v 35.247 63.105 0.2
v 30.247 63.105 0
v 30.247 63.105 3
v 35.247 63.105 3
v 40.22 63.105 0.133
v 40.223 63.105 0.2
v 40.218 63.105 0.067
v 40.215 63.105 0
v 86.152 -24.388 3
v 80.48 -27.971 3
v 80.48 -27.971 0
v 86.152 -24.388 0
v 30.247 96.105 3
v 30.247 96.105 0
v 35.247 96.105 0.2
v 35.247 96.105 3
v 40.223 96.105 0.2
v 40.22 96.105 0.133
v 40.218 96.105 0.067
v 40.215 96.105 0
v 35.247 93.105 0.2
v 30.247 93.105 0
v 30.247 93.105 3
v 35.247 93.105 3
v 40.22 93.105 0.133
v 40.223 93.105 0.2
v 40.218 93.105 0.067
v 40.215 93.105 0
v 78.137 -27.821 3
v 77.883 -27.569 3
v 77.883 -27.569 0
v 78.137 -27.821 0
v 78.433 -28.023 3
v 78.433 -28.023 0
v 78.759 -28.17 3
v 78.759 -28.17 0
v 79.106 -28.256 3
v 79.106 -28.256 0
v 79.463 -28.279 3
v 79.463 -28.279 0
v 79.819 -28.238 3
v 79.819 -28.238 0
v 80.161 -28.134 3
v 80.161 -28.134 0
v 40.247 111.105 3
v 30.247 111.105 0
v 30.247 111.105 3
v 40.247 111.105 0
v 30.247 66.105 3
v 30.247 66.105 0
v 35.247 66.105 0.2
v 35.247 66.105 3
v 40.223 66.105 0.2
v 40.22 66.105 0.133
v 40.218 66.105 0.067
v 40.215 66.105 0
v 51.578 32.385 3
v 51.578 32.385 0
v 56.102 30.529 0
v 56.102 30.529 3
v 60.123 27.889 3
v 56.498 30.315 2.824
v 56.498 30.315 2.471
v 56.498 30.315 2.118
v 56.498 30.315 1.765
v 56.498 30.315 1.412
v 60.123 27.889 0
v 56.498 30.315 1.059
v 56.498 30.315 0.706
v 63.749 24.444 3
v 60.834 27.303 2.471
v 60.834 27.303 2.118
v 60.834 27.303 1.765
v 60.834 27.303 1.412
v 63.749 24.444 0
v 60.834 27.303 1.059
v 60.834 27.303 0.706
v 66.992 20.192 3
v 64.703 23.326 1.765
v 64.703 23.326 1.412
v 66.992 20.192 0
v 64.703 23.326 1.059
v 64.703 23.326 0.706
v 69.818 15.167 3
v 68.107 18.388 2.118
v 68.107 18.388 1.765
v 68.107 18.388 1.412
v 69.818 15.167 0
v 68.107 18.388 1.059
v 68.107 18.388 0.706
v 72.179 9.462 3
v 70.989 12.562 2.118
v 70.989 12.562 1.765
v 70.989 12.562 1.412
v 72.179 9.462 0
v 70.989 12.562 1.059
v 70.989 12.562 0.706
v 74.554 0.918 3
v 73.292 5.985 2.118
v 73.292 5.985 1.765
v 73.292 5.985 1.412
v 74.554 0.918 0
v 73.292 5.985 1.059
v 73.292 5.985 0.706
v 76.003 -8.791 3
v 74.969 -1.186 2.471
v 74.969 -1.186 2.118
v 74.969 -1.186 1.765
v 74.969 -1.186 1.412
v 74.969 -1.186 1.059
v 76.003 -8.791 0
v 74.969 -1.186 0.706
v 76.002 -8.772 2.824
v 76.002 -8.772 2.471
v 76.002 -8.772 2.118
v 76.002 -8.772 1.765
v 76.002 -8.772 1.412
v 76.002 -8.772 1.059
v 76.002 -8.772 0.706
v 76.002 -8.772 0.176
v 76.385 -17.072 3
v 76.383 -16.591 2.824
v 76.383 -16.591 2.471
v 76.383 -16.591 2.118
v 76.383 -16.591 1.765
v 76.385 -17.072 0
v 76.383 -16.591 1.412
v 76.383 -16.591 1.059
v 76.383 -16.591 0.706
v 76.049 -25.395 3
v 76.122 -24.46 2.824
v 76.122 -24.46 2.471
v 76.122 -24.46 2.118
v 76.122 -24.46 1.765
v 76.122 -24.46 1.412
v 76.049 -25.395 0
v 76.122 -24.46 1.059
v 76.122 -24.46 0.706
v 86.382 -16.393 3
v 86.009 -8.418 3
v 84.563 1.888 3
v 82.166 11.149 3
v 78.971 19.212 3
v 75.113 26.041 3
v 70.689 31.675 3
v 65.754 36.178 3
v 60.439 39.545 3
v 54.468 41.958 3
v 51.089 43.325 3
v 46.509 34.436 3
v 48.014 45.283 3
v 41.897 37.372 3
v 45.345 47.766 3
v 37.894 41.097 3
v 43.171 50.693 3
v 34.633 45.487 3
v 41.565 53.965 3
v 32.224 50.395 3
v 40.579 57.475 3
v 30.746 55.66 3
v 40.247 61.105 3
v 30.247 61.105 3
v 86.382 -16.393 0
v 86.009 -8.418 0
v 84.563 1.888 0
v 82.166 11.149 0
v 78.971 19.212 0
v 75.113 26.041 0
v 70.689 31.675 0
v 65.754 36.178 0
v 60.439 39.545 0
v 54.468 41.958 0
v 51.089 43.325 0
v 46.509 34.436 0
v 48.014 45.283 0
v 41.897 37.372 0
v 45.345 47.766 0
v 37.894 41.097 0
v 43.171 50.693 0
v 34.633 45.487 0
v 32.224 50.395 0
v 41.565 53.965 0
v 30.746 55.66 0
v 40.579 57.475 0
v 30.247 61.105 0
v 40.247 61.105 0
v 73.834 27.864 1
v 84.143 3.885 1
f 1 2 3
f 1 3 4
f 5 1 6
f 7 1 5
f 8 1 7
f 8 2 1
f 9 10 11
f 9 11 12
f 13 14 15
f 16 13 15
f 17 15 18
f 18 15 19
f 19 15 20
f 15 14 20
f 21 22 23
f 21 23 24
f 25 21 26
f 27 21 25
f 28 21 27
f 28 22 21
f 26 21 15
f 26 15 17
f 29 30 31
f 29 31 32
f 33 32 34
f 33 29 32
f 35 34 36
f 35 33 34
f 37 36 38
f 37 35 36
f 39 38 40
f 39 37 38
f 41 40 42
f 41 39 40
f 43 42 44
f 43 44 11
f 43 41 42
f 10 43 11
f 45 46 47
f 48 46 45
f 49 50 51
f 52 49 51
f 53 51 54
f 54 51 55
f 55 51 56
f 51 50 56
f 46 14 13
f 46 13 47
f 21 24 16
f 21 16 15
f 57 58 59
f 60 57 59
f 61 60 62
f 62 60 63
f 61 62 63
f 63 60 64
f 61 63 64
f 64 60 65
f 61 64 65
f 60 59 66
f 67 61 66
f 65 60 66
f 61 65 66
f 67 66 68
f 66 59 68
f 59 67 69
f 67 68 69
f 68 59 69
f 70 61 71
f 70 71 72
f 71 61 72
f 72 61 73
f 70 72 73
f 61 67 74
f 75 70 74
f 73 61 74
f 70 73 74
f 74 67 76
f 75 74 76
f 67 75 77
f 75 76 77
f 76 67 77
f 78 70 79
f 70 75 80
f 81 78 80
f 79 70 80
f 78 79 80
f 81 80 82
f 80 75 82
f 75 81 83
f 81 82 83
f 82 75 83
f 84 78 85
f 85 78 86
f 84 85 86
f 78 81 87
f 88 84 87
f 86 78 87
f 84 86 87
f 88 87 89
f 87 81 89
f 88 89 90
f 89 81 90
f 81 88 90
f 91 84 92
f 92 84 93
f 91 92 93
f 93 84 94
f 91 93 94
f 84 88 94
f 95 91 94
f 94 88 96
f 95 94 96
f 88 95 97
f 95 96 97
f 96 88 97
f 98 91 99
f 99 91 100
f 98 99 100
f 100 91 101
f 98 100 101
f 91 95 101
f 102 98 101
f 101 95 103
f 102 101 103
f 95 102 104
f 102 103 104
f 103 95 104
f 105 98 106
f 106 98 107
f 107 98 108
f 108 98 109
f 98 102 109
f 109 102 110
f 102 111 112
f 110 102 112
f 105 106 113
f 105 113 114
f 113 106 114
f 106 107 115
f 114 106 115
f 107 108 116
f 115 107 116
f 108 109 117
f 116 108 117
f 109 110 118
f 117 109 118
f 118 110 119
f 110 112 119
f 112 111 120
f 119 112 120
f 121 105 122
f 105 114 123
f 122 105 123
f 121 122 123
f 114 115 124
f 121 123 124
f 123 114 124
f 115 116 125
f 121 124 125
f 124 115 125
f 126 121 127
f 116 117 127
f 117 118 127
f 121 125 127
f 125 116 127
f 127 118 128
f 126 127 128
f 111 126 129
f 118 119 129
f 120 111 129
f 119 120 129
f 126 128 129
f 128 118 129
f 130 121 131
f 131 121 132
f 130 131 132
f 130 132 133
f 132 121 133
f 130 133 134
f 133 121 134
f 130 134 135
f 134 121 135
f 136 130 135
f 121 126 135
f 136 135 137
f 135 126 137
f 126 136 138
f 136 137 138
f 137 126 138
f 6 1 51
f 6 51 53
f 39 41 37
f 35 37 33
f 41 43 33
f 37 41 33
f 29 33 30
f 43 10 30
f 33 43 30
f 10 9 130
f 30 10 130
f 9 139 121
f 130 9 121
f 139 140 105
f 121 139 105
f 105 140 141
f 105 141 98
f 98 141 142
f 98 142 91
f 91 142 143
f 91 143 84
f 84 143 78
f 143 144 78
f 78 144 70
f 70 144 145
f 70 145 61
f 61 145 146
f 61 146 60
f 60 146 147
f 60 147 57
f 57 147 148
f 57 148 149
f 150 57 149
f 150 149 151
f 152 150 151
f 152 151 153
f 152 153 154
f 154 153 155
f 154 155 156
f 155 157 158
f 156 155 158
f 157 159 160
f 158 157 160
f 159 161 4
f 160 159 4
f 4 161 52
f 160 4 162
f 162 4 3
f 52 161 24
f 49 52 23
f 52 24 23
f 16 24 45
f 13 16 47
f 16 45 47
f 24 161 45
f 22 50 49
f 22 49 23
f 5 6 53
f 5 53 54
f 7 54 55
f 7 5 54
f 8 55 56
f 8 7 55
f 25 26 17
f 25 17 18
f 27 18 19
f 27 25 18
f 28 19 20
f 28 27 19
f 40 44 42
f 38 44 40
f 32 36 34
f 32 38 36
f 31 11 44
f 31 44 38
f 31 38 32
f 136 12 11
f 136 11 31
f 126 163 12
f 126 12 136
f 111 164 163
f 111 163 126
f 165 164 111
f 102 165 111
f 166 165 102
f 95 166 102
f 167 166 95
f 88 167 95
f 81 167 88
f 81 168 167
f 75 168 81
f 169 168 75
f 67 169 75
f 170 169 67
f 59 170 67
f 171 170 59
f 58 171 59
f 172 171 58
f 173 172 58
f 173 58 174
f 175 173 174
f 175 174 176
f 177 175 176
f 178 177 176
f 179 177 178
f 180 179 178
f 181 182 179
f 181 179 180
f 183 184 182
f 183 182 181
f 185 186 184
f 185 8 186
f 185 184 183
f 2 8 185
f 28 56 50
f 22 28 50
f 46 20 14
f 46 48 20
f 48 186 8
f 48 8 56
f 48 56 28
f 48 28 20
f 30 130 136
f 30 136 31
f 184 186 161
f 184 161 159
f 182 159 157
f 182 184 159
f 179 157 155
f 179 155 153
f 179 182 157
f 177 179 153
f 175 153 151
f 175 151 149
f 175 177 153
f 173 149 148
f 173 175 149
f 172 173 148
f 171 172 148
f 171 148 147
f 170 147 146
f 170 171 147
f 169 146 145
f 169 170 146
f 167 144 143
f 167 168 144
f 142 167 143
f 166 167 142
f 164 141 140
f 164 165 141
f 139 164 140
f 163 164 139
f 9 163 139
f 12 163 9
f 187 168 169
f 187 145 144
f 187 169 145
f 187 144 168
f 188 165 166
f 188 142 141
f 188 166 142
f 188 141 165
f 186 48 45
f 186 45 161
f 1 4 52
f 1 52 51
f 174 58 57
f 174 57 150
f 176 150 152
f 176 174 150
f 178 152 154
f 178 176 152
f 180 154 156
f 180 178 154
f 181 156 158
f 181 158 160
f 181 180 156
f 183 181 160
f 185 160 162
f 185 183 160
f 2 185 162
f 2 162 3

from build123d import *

# Parameters (mm, degrees)
BOSS_EXTRU_2_DEPTH      = 3
ENL_V_MAT_EXTRU_1_DEPTH = 141.768934672
EMPREINTE1_START        = 63.105178129
EMPREINTE1_DEPTH        = 3
EMPREINTE1_START_2      = 93.105178129
EMPREINTE1_2_DEPTH      = 3


# Read off the part's stored shape, not the designer's step: Empreinte1
with BuildPart() as part:
    # Esquisse1 → Boss.-Extru.2 (new body)
    with BuildSketch(Plane.XY):
        with BuildLine():
            Line((40.247233076, 111.105178129), (40.247233076, 61.105178129))
            ThreePointArc((40.247233076, 61.105178129), (44.191308202, 49.180108885), (54.467960723, 41.95837654))
            add(Edge.make_bspline(
                [(54.467960723, 41.95837654), (93.469157599, 30.186251687), (94.060386504, -42.130931626), (70.625681641, -69.023414216)],
                knots=[0.073601613, 0.073601613, 0.073601613, 0.073601613, 1, 1, 1, 1], degree=3))
            Line((70.625681641, -69.023414216), (63.086562616, -62.453658944))
            add(Edge.make_bspline(
                [(51.578324546, 32.384975746), (52.441823747, 32.124337068), (54.160244695, 31.504173294), (57.306848095, 29.97035453), (60.909260152, 27.464002891), (64.778911343, 23.487842732), (69.333722485, 16.888912111), (73.713189985, 6.383804922), (76.439302823, -8.617528818), (76.523407917, -21.892716717), (75.336804817, -32.248132674), (73.851279993, -39.698340102), (71.811754469, -46.646923176), (69.699842941, -51.863805262), (67.806756273, -55.601272185), (66.298875889, -58.166006571), (64.985680603, -60.08494816), (63.904092742, -61.488799964), (63.366023798, -62.13296342), (63.086562616, -62.453658944)],
                knots=[0.073601613, 0.073601613, 0.073601613, 0.073601613, 0.102551563, 0.131501512, 0.189401411, 0.247301311, 0.30520121, 0.421001008, 0.536800806, 0.652600605, 0.710500504, 0.768400403, 0.826300302, 0.884200202, 0.913150151, 0.942100101, 0.97105005, 0.985525025, 1, 1, 1, 1], degree=3))
            ThreePointArc((51.578324546, 32.384975746), (36.163345766, 43.217574263), (30.247233076, 61.105178129))
            Line((30.247233076, 61.105178129), (30.247233076, 111.105178129))
            Line((30.247233076, 111.105178129), (40.247233076, 111.105178129))
        make_face()
    extrude(amount=BOSS_EXTRU_2_DEPTH)

    # Esquisse2 → Enlèv. mat.-Extru.1 (cut, through all)
    with BuildSketch(Plane.XY.offset(3)):
        with BuildLine():
            Line((58.604840791, -65.718091867), (72.675095618, -21.396789164))
            Line((72.675095618, -21.396789164), (77.883188433, -27.569343611))
            ThreePointArc((77.883188433, -27.569343611), (79.106345528, -28.256142913), (80.479757382, -27.970579539))
            Line((80.479757382, -27.970579539), (87.91787168, -23.272823141))
            Line((87.91787168, -23.272823141), (76.157367596, -75.355055511))
            Line((76.157367596, -75.355055511), (58.604840791, -65.718091867))
        make_face()
    extrude(amount=-ENL_V_MAT_EXTRU_1_DEPTH, mode=Mode.SUBTRACT)

    # Empreinte1 outline → Empreinte1 (cut)
    with BuildSketch(Plane(origin=(0, 0, 0), x_dir=(1, 0, 0), z_dir=(0, 1, 0)).offset(EMPREINTE1_START)):
        with BuildLine():
            ThreePointArc((40.222725568, -0.2), (40.219098005, -0.099995306), (40.215220265, 0))
            Line((40.215220265, 0), (30.247233076, 0))
            Line((30.247233076, 0), (30.247233076, -3))
            Line((30.247233076, -3), (35.247233076, -3))
            Line((35.247233076, -3), (35.247233076, -0.2))
            Line((35.247233076, -0.2), (40.222725568, -0.2))
        make_face()
    extrude(amount=EMPREINTE1_DEPTH, mode=Mode.SUBTRACT)

    # Empreinte1 2 outline → Empreinte1 2 (cut)
    with BuildSketch(Plane(origin=(0, 0, 0), x_dir=(1, 0, 0), z_dir=(0, 1, 0)).offset(EMPREINTE1_START_2)):
        with BuildLine():
            ThreePointArc((40.222725568, -0.2), (40.219098005, -0.099995306), (40.215220265, 0))
            Line((40.215220265, 0), (30.247233076, 0))
            Line((30.247233076, 0), (30.247233076, -3))
            Line((30.247233076, -3), (35.247233076, -3))
            Line((35.247233076, -3), (35.247233076, -0.2))
            Line((35.247233076, -0.2), (40.222725568, -0.2))
        make_face()
    extrude(amount=EMPREINTE1_2_DEPTH, mode=Mode.SUBTRACT)


solid = part.part
